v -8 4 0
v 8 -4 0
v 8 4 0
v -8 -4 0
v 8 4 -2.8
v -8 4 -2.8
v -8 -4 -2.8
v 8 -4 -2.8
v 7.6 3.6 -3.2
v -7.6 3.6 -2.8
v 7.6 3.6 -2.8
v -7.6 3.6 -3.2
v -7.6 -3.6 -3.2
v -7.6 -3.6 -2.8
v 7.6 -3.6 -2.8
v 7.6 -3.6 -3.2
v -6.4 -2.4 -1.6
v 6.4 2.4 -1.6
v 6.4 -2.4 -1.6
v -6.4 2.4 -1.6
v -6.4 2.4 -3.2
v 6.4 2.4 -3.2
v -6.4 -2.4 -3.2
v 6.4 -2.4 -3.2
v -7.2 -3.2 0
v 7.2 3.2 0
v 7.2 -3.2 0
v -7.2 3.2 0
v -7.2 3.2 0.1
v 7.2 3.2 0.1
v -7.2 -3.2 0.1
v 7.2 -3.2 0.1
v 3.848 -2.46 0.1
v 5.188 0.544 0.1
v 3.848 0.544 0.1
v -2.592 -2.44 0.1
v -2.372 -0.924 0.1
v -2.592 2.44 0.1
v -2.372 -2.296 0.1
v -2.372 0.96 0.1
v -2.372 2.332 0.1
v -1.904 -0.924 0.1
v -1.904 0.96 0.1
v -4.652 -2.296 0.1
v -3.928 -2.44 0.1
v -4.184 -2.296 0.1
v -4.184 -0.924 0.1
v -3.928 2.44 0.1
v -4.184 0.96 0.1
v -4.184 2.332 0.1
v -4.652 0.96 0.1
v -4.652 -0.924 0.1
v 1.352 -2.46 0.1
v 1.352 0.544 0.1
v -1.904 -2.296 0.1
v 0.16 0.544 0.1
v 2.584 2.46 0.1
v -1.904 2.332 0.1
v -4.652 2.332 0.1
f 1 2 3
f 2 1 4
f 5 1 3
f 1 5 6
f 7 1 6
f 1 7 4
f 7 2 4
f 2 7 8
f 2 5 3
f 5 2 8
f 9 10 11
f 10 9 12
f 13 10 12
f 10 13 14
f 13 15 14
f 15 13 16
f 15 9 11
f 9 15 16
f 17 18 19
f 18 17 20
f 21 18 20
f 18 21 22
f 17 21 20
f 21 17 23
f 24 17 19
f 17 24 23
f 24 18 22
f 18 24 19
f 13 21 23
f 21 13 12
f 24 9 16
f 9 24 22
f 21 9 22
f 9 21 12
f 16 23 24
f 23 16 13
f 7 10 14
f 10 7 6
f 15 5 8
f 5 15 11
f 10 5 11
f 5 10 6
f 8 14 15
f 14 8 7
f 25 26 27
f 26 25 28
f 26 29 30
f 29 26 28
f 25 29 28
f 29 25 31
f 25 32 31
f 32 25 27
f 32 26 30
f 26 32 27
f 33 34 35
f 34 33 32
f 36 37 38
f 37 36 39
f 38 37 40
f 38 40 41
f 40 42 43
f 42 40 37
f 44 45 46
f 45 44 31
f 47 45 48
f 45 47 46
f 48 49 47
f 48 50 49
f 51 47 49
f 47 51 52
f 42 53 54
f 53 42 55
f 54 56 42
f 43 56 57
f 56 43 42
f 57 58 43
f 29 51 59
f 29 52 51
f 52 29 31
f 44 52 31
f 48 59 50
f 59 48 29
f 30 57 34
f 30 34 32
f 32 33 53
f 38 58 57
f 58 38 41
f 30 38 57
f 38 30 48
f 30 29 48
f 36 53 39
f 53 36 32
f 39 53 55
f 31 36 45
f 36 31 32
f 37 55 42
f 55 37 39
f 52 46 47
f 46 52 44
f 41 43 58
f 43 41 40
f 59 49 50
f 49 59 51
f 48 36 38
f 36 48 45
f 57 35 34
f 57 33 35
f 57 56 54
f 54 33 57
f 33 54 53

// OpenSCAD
// file: ../p/box5.scad
use <../lib.scad>
function ldraw_lib__box5() = [
// 0 Box with 5 Faces and All Edges
// 0 Name: box5.dat
// 0 Author: James Jessiman
// 0 !LDRAW_ORG Primitive UPDATE 2012-01
// 0 !LICENSE Licensed under CC BY 4.0 : see CAreadme.txt
// 
// 0 BFC CERTIFY CCW
  [0,"BFC","CERTIFY"],
  [0,"BFC","CCW"],
// 
// 0 !HISTORY 2002-04-03 [sbliss] Modified for BFC compliance
// 0 !HISTORY 2002-04-25 [PTadmin] Official Update 2002-02
// 0 !HISTORY 2007-06-24 [PTadmin] Header formatted for Contributor Agreement
// 0 !HISTORY 2008-07-01 [PTadmin] Official Update 2008-01
// 0 !HISTORY 2012-02-16 [Philo] Changed to CCW
// 0 !HISTORY 2012-03-30 [PTadmin] Official Update 2012-01
// 
// 
// 2 24 1 1 1 -1 1 1
  [2,24,1,1,1,-1,1,1],
// 2 24 -1 1 1 -1 1 -1
  [2,24,-1,1,1,-1,1,-1],
// 2 24 -1 1 -1 1 1 -1
  [2,24,-1,1,-1,1,1,-1],
// 2 24 1 1 -1 1 1 1
  [2,24,1,1,-1,1,1,1],
// 2 24 1 0 1 -1 0 1
  [2,24,1,0,1,-1,0,1],
// 2 24 -1 0 1 -1 0 -1
  [2,24,-1,0,1,-1,0,-1],
// 2 24 -1 0 -1 1 0 -1
  [2,24,-1,0,-1,1,0,-1],
// 2 24 1 0 -1 1 0 1
  [2,24,1,0,-1,1,0,1],
// 2 24 1 0 1 1 1 1
  [2,24,1,0,1,1,1,1],
// 2 24 -1 0 1 -1 1 1
  [2,24,-1,0,1,-1,1,1],
// 2 24 1 0 -1 1 1 -1
  [2,24,1,0,-1,1,1,-1],
// 2 24 -1 0 -1 -1 1 -1
  [2,24,-1,0,-1,-1,1,-1],
// 4 16 -1 1 1 1 1 1 1 1 -1 -1 1 -1
  [4,16,-1,1,1,1,1,1,1,1,-1,-1,1,-1],
// 4 16 -1 1 1 -1 0 1 1 0 1 1 1 1
  [4,16,-1,1,1,-1,0,1,1,0,1,1,1,1],
// 4 16 -1 1 -1 -1 0 -1 -1 0 1 -1 1 1
  [4,16,-1,1,-1,-1,0,-1,-1,0,1,-1,1,1],
// 4 16 1 1 -1 1 0 -1 -1 0 -1 -1 1 -1
  [4,16,1,1,-1,1,0,-1,-1,0,-1,-1,1,-1],
// 4 16 1 1 1 1 0 1 1 0 -1 1 1 -1
  [4,16,1,1,1,1,0,1,1,0,-1,1,1,-1],
];
module ldraw_lib__box5(step=0, col=false, unit=2/5, alt=false, line=0.2, solid=!$preview)
    makepoly(ldraw_lib__box5(), step=step, col=col, unit=unit, alt=alt, line=line, solid=solid);
ldraw_lib__box5(line=0.2);
// file: ../p/box4.scad
use <../lib.scad>
function ldraw_lib__box4() = [
// 0 Box with 4 Faces (2 Parallel Pairs) and All Edges
// 0 Name: box4.dat
// 0 Author: James Jessiman
// 0 !LDRAW_ORG Primitive UPDATE 2012-01
// 0 !LICENSE Licensed under CC BY 4.0 : see CAreadme.txt
// 
// 0 BFC CERTIFY CCW
  [0,"BFC","CERTIFY"],
  [0,"BFC","CCW"],
// 
// 0 !HISTORY 2002-04-03 [sbliss] Modified for BFC compliance
// 0 !HISTORY 2002-04-25 [PTadmin] Official Update 2002-02
// 0 !HISTORY 2007-06-24 [PTadmin] Header formatted for Contributor Agreement
// 0 !HISTORY 2008-07-01 [PTadmin] Official Update 2008-01
// 0 !HISTORY 2012-02-16 [Philo] Changed to CCW
// 0 !HISTORY 2012-03-30 [PTadmin] Official Update 2012-01
// 
// 
// 2 24 1 1 1 -1 1 1
  [2,24,1,1,1,-1,1,1],
// 2 24 -1 1 1 -1 1 -1
  [2,24,-1,1,1,-1,1,-1],
// 2 24 -1 1 -1 1 1 -1
  [2,24,-1,1,-1,1,1,-1],
// 2 24 1 1 -1 1 1 1
  [2,24,1,1,-1,1,1,1],
// 2 24 1 0 1 -1 0 1
  [2,24,1,0,1,-1,0,1],
// 2 24 -1 0 1 -1 0 -1
  [2,24,-1,0,1,-1,0,-1],
// 2 24 -1 0 -1 1 0 -1
  [2,24,-1,0,-1,1,0,-1],
// 2 24 1 0 -1 1 0 1
  [2,24,1,0,-1,1,0,1],
// 2 24 1 0 1 1 1 1
  [2,24,1,0,1,1,1,1],
// 2 24 -1 0 1 -1 1 1
  [2,24,-1,0,1,-1,1,1],
// 2 24 1 0 -1 1 1 -1
  [2,24,1,0,-1,1,1,-1],
// 2 24 -1 0 -1 -1 1 -1
  [2,24,-1,0,-1,-1,1,-1],
// 4 16 -1 1 1 -1 0 1 1 0 1 1 1 1
  [4,16,-1,1,1,-1,0,1,1,0,1,1,1,1],
// 4 16 -1 1 -1 -1 0 -1 -1 0 1 -1 1 1
  [4,16,-1,1,-1,-1,0,-1,-1,0,1,-1,1,1],
// 4 16 1 1 -1 1 0 -1 -1 0 -1 -1 1 -1
  [4,16,1,1,-1,1,0,-1,-1,0,-1,-1,1,-1],
// 4 16 1 1 1 1 0 1 1 0 -1 1 1 -1
  [4,16,1,1,1,1,0,1,1,0,-1,1,1,-1],
];
module ldraw_lib__box4(step=0, col=false, unit=2/5, alt=false, line=0.2, solid=!$preview)
    makepoly(ldraw_lib__box4(), step=step, col=col, unit=unit, alt=alt, line=line, solid=solid);
ldraw_lib__box4(line=0.2);
// file: ../p/box5-12.scad
use <../lib.scad>
function ldraw_lib__box5_12() = [
// 0 Box with 5 Faces without Any Edges
// 0 Name: box5-12.dat
// 0 Author: Chris Dee [cwdee]
// 0 !LDRAW_ORG Primitive UPDATE 2009-02
// 0 !LICENSE Licensed under CC BY 4.0 : see CAreadme.txt
// 
// 0 BFC CERTIFY CCW
  [0,"BFC","CERTIFY"],
  [0,"BFC","CCW"],
// 
// 0 !HISTORY 2009-09-03 [PTadmin] Official Update 2009-02
// 
// 
// 4 16 1 1 1 1 1 -1 -1 1 -1 -1 1 1
  [4,16,1,1,1,1,1,-1,-1,1,-1,-1,1,1],
// 4 16 -1 0 1 1 0 1 1 1 1 -1 1 1
  [4,16,-1,0,1,1,0,1,1,1,1,-1,1,1],
// 4 16 -1 0 -1 -1 0 1 -1 1 1 -1 1 -1
  [4,16,-1,0,-1,-1,0,1,-1,1,1,-1,1,-1],
// 4 16 1 0 -1 -1 0 -1 -1 1 -1 1 1 -1
  [4,16,1,0,-1,-1,0,-1,-1,1,-1,1,1,-1],
// 4 16 1 0 1 1 0 -1 1 1 -1 1 1 1
  [4,16,1,0,1,1,0,-1,1,1,-1,1,1,1],
// 0
];
module ldraw_lib__box5_12(step=0, col=false, unit=2/5, alt=false, line=0.2, solid=!$preview)
    makepoly(ldraw_lib__box5_12(), step=step, col=col, unit=unit, alt=alt, line=line, solid=solid);
ldraw_lib__box5_12(line=0.2);
// file: s/3069bs01.scad
use <../../lib.scad>
use <../../p/box4.scad>
use <../../p/box5.scad>
function ldraw_lib__s__3069bs01() = [
// 0 ~Tile  1 x  2 with Groove without Top Face
// 0 Name: s\3069bs01.dat
// 0 Author: Santeri Piippo [arezey]
// 0 !LDRAW_ORG Subpart UPDATE 2010-02
// 0 !LICENSE Licensed under CC BY 4.0 : see CAreadme.txt
// 
// 0 BFC CERTIFY CCW
  [0,"BFC","CERTIFY"],
  [0,"BFC","CCW"],
// 
// 0 !HISTORY 2010-07-05 [PTadmin] Official Update 2010-02
// 
// 
// 1 16 0 0 0 20 0 0 0 7 0 0 0 10 box4.dat
  [1,16,0,0,0,20,0,0,0,7,0,0,0,10, ldraw_lib__box4()],
// 1 16 0 7 0 19 0 0 0 1 0 0 0 9 box4.dat
  [1,16,0,7,0,19,0,0,0,1,0,0,0,9, ldraw_lib__box4()],
// 0 BFC INVERTNEXT
  [0,"BFC","INVERTNEXT"],
// 1 16 0 8 0 16 0 0 0 -4 0 0 0 6 box5.dat
  [1,16,0,8,0,16,0,0,0,-4,0,0,0,6, ldraw_lib__box5()],
// 4 16 -19 8 9 -16 8 6 -16 8 -6 -19 8 -9
  [4,16,-19,8,9,-16,8,6,-16,8,-6,-19,8,-9],
// 4 16 19 8 -9 16 8 -6 16 8 6 19 8 9
  [4,16,19,8,-9,16,8,-6,16,8,6,19,8,9],
// 4 16 19 8 9 16 8 6 -16 8 6 -19 8 9
  [4,16,19,8,9,16,8,6,-16,8,6,-19,8,9],
// 4 16 -19 8 -9 -16 8 -6 16 8 -6 19 8 -9
  [4,16,-19,8,-9,-16,8,-6,16,8,-6,19,8,-9],
// 4 16 -20 7 10 -19 7 9 -19 7 -9 -20 7 -10
  [4,16,-20,7,10,-19,7,9,-19,7,-9,-20,7,-10],
// 4 16 20 7 -10 19 7 -9 19 7 9 20 7 10
  [4,16,20,7,-10,19,7,-9,19,7,9,20,7,10],
// 4 16 20 7 10 19 7 9 -19 7 9 -20 7 10
  [4,16,20,7,10,19,7,9,-19,7,9,-20,7,10],
// 4 16 -20 7 -10 -19 7 -9 19 7 -9 20 7 -10
  [4,16,-20,7,-10,-19,7,-9,19,7,-9,20,7,-10],
// 0 //
];
module ldraw_lib__s__3069bs01(step=0, col=false, unit=2/5, alt=false, line=0.2, solid=!$preview)
    makepoly(ldraw_lib__s__3069bs01(), step=step, col=col, unit=unit, alt=alt, line=line, solid=solid);
ldraw_lib__s__3069bs01(line=0.2);
// file: 821577e.scad
use <../lib.scad>
use <../p/box5-12.scad>
function ldraw_lib__821577e() = [
// 0 Sticker  0.8 x  1.8 with Car and Red Straight Arrow Up
// 0 Name: 821577e.dat
// 0 Author: Evert-Jan Boer [ejboer]
// 0 !LDRAW_ORG Part UPDATE 2026-07
// 0 !LICENSE Licensed under CC BY 4.0 : see CAreadme.txt
// 
// 0 BFC CERTIFY CCW
  [0,"BFC","CERTIFY"],
  [0,"BFC","CCW"],
// 
// 0 !CATEGORY Sticker
// 0 !KEYWORDS Multi Control, Set 8082
// 
// 0 !HISTORY 2026-07-30 [OrionP] Official Update 2026-07
// 
// 1 16 0 -.25 0 18 0 0 0 0.25 0 0 0 8 box5-12.dat
  [1,16,0,-.25,0,18,0,0,0,0.25,0,0,0,8, ldraw_lib__box5_12()],
// 4 16 12.97 -.25 1.36 9.62 -.25 1.36 9.62 -.25 -6.15 18 -.25 -8
  [4,16,12.97,-.25,1.36,9.62,-.25,1.36,9.62,-.25,-6.15,18,-.25,-8],
// 4 16 -5.93 -.25 -5.74 -5.93 -.25 -2.31 -6.48 -.25 6.1 -6.48 -.25 -6.1
  [4,16,-5.93,-.25,-5.74,-5.93,-.25,-2.31,-6.48,-.25,6.1,-6.48,-.25,-6.1],
// 3 16 -6.48 -.25 6.1 -5.93 -.25 -2.31 -5.93 -.25 2.4
  [3,16,-6.48,-.25,6.1,-5.93,-.25,-2.31,-5.93,-.25,2.4],
// 3 16 -6.48 -.25 6.1 -5.93 -.25 2.4 -5.93 -.25 5.83
  [3,16,-6.48,-.25,6.1,-5.93,-.25,2.4,-5.93,-.25,5.83],
// 4 16 -5.93 -.25 -2.31 -4.76 -.25 -2.31 -4.76 -.25 2.4 -5.93 -.25 2.4
  [4,16,-5.93,-.25,-2.31,-4.76,-.25,-2.31,-4.76,-.25,2.4,-5.93,-.25,2.4],
// 4 16 -9.82 -.25 -6.1 -10.46 -.25 -5.74 -11.63 -.25 -5.74 -18 -.25 -8
  [4,16,-9.82,-.25,-6.1,-10.46,-.25,-5.74,-11.63,-.25,-5.74,-18,-.25,-8],
// 4 16 -10.46 -.25 -5.74 -9.82 -.25 -6.1 -9.82 -.25 6.1 -10.46 -.25 -2.31
  [4,16,-10.46,-.25,-5.74,-9.82,-.25,-6.1,-9.82,-.25,6.1,-10.46,-.25,-2.31],
// 3 16 -9.82 -.25 6.1 -10.46 -.25 2.4 -10.46 -.25 -2.31
  [3,16,-9.82,-.25,6.1,-10.46,-.25,2.4,-10.46,-.25,-2.31],
// 3 16 -9.82 -.25 6.1 -10.46 -.25 5.83 -10.46 -.25 2.4
  [3,16,-9.82,-.25,6.1,-10.46,-.25,5.83,-10.46,-.25,2.4],
// 4 16 -10.46 -.25 2.4 -11.63 -.25 2.4 -11.63 -.25 -2.31 -10.46 -.25 -2.31
  [4,16,-10.46,-.25,2.4,-11.63,-.25,2.4,-11.63,-.25,-2.31,-10.46,-.25,-2.31],
// 4 16 3.38 -.25 -6.15 3.38 -.25 1.36 -4.76 -.25 -2.31 -4.76 -.25 -5.74
  [4,16,3.38,-.25,-6.15,3.38,-.25,1.36,-4.76,-.25,-2.31,-4.76,-.25,-5.74],
// 3 16 3.38 -.25 1.36 .4 -.25 1.36 -4.76 -.25 -2.31
  [3,16,3.38,-.25,1.36,.4,-.25,1.36,-4.76,-.25,-2.31],
// 4 16 -4.76 -.25 -2.31 .4 -.25 1.36 6.46 -.25 6.15 -4.76 -.25 2.4
  [4,16,-4.76,-.25,-2.31,.4,-.25,1.36,6.46,-.25,6.15,-4.76,-.25,2.4],
// 3 16 6.46 -.25 6.15 -4.76 -.25 5.83 -4.76 -.25 2.4
  [3,16,6.46,-.25,6.15,-4.76,-.25,5.83,-4.76,-.25,2.4],
// 3 16 -18 -.25 8 -11.63 -.25 2.4 -11.63 -.25 5.83
  [3,16,-18,-.25,8,-11.63,-.25,2.4,-11.63,-.25,5.83],
// 4 16 -11.63 -.25 -2.31 -11.63 -.25 2.4 -18 -.25 8 -18 -.25 -8
  [4,16,-11.63,-.25,-2.31,-11.63,-.25,2.4,-18,-.25,8,-18,-.25,-8],
// 3 16 -11.63 -.25 -5.74 -11.63 -.25 -2.31 -18 -.25 -8
  [3,16,-11.63,-.25,-5.74,-11.63,-.25,-2.31,-18,-.25,-8],
// 4 16 -10.46 -.25 5.83 -9.82 -.25 6.1 -18 -.25 8 -11.63 -.25 5.83
  [4,16,-10.46,-.25,5.83,-9.82,-.25,6.1,-18,-.25,8,-11.63,-.25,5.83],
// 3 16 18 -.25 8 6.46 -.25 6.15 12.97 -.25 1.36
  [3,16,18,-.25,8,6.46,-.25,6.15,12.97,-.25,1.36],
// 3 16 18 -.25 8 12.97 -.25 1.36 18 -.25 -8
  [3,16,18,-.25,8,12.97,-.25,1.36,18,-.25,-8],
// 3 16 18 -.25 -8 9.62 -.25 -6.15 3.38 -.25 -6.15
  [3,16,18,-.25,-8,9.62,-.25,-6.15,3.38,-.25,-6.15],
// 4 16 -6.48 -.25 6.1 -5.93 -.25 5.83 -4.76 -.25 5.83 6.46 -.25 6.15
  [4,16,-6.48,-.25,6.1,-5.93,-.25,5.83,-4.76,-.25,5.83,6.46,-.25,6.15],
// 4 16 -9.82 -.25 6.1 -6.48 -.25 6.1 6.46 -.25 6.15 18 -.25 8
  [4,16,-9.82,-.25,6.1,-6.48,-.25,6.1,6.46,-.25,6.15,18,-.25,8],
// 3 16 18 -.25 8 -18 -.25 8 -9.82 -.25 6.1
  [3,16,18,-.25,8,-18,-.25,8,-9.82,-.25,6.1],
// 4 16 18 -.25 -8 3.38 -.25 -6.15 -5.93 -.25 -5.74 -6.48 -.25 -6.1
  [4,16,18,-.25,-8,3.38,-.25,-6.15,-5.93,-.25,-5.74,-6.48,-.25,-6.1],
// 3 16 -5.93 -.25 -5.74 3.38 -.25 -6.15 -4.76 -.25 -5.74
  [3,16,-5.93,-.25,-5.74,3.38,-.25,-6.15,-4.76,-.25,-5.74],
// 4 16 -18 -.25 -8 18 -.25 -8 -6.48 -.25 -6.1 -9.82 -.25 -6.1
  [4,16,-18,-.25,-8,18,-.25,-8,-6.48,-.25,-6.1,-9.82,-.25,-6.1],
// 
// 0 BFC NOCLIP
  [0,"BFC","NOCLIP"],
// 
// 4 14 -5.93 -.25 -2.31 -5.93 -.25 -5.74 -4.76 -.25 -5.74 -4.76 -.25 -2.31
  [4,14,-5.93,-.25,-2.31,-5.93,-.25,-5.74,-4.76,-.25,-5.74,-4.76,-.25,-2.31],
// 4 14 -11.63 -.25 -2.31 -11.63 -.25 -5.74 -10.46 -.25 -5.74 -10.46 -.25 -2.31
  [4,14,-11.63,-.25,-2.31,-11.63,-.25,-5.74,-10.46,-.25,-5.74,-10.46,-.25,-2.31],
// 4 14 -5.93 -.25 5.83 -5.93 -.25 2.4 -4.76 -.25 2.4 -4.76 -.25 5.83
  [4,14,-5.93,-.25,5.83,-5.93,-.25,2.4,-4.76,-.25,2.4,-4.76,-.25,5.83],
// 4 14 -11.63 -.25 5.83 -11.63 -.25 2.4 -10.46 -.25 2.4 -10.46 -.25 5.83
  [4,14,-11.63,-.25,5.83,-11.63,-.25,2.4,-10.46,-.25,2.4,-10.46,-.25,5.83],
// 4 0 -9.82 -.25 6.1 -9.82 -.25 -6.1 -6.48 -.25 -6.1 -6.48 -.25 6.1
  [4,0,-9.82,-.25,6.1,-9.82,-.25,-6.1,-6.48,-.25,-6.1,-6.48,-.25,6.1],
// 3 4 6.46 -.25 6.15 9.62 -.25 1.36 12.97 -.25 1.36
  [3,4,6.46,-.25,6.15,9.62,-.25,1.36,12.97,-.25,1.36],
// 3 4 6.46 -.25 6.15 9.62 -.25 -6.15 9.62 -.25 1.36
  [3,4,6.46,-.25,6.15,9.62,-.25,-6.15,9.62,-.25,1.36],
// 3 4 6.46 -.25 6.15 .4 -.25 1.36 3.38 -.25 1.36
  [3,4,6.46,-.25,6.15,.4,-.25,1.36,3.38,-.25,1.36],
// 4 4 6.46 -.25 6.15 3.38 -.25 1.36 3.38 -.25 -6.15 9.62 -.25 -6.15
  [4,4,6.46,-.25,6.15,3.38,-.25,1.36,3.38,-.25,-6.15,9.62,-.25,-6.15],
];
module ldraw_lib__821577e(step=0, col=false, unit=2/5, alt=false, line=0.2, solid=!$preview)
    makepoly(ldraw_lib__821577e(), step=step, col=col, unit=unit, alt=alt, line=line, solid=solid);
ldraw_lib__821577e(line=0.2);
// file: 3069b.scad
use <../lib.scad>
use <s/3069bs01.scad>
function ldraw_lib__3069b() = [
// 0 Tile  1 x  2 with Groove
// 0 Name: 3069b.dat
// 0 Author: Santeri Piippo [arezey]
// 0 !LDRAW_ORG Part UPDATE 2010-02
// 0 !LICENSE Licensed under CC BY 4.0 : see CAreadme.txt
// 
// 0 BFC CERTIFY CCW
  [0,"BFC","CERTIFY"],
  [0,"BFC","CCW"],
// 
// 0 !KEYWORDS BrickLink 3069
// 
// 0 !HISTORY 2010-07-05 [PTadmin] Official Update 2010-02
// 
// 
// 4 16 20 0 -10 20 0 10 -20 0 10 -20 0 -10
  [4,16,20,0,-10,20,0,10,-20,0,10,-20,0,-10],
// 1 16 0 0 0 1 0 0 0 1 0 0 0 1 s\3069bs01.dat
  [1,16,0,0,0,1,0,0,0,1,0,0,0,1, ldraw_lib__s__3069bs01()],
// 0 //
];
module ldraw_lib__3069b(step=0, col=false, unit=2/5, alt=false, line=0.2, solid=!$preview)
    makepoly(ldraw_lib__3069b(), step=step, col=col, unit=unit, alt=alt, line=line, solid=solid);
ldraw_lib__3069b(line=0.2);
// main file
use <../lib.scad>
use <3069b.scad>
use <821577e.scad>
function ldraw_lib__3069bd1u() = [
// 0 Tile  1 x  2 with Car and Red Straight Arrow Up Sticker
// 0 Name: 3069bd1u.dat
// 0 Author: Evert-Jan Boer [ejboer]
// 0 !LDRAW_ORG Shortcut UPDATE 2026-07
// 0 !LICENSE Licensed under CC BY 4.0 : see CAreadme.txt
// 
// 0 BFC CERTIFY CCW
  [0,"BFC","CERTIFY"],
  [0,"BFC","CCW"],
// 
// 0 !CATEGORY Sticker Shortcut
// 0 !KEYWORDS Bricklink 3069pb0066, Set 8082
// 
// 0 !HISTORY 2026-07-30 [OrionP] Official Update 2026-07
// 
// 1 16 0 0 0 1 0 0 0 1 0 0 0 1 3069b.dat
  [1,16,0,0,0,1,0,0,0,1,0,0,0,1, ldraw_lib__3069b()],
// 1 16 0 0 0 1 0 0 0 1 0 0 0 1 821577e.dat
  [1,16,0,0,0,1,0,0,0,1,0,0,0,1, ldraw_lib__821577e()],
];
module ldraw_lib__3069bd1u(step=0, col=false, unit=2/5, alt=false, line=0.2, solid=!$preview)
    makepoly(ldraw_lib__3069bd1u(), step=step, col=col, unit=unit, alt=alt, line=line, solid=solid);
ldraw_lib__3069bd1u(line=0.2);
